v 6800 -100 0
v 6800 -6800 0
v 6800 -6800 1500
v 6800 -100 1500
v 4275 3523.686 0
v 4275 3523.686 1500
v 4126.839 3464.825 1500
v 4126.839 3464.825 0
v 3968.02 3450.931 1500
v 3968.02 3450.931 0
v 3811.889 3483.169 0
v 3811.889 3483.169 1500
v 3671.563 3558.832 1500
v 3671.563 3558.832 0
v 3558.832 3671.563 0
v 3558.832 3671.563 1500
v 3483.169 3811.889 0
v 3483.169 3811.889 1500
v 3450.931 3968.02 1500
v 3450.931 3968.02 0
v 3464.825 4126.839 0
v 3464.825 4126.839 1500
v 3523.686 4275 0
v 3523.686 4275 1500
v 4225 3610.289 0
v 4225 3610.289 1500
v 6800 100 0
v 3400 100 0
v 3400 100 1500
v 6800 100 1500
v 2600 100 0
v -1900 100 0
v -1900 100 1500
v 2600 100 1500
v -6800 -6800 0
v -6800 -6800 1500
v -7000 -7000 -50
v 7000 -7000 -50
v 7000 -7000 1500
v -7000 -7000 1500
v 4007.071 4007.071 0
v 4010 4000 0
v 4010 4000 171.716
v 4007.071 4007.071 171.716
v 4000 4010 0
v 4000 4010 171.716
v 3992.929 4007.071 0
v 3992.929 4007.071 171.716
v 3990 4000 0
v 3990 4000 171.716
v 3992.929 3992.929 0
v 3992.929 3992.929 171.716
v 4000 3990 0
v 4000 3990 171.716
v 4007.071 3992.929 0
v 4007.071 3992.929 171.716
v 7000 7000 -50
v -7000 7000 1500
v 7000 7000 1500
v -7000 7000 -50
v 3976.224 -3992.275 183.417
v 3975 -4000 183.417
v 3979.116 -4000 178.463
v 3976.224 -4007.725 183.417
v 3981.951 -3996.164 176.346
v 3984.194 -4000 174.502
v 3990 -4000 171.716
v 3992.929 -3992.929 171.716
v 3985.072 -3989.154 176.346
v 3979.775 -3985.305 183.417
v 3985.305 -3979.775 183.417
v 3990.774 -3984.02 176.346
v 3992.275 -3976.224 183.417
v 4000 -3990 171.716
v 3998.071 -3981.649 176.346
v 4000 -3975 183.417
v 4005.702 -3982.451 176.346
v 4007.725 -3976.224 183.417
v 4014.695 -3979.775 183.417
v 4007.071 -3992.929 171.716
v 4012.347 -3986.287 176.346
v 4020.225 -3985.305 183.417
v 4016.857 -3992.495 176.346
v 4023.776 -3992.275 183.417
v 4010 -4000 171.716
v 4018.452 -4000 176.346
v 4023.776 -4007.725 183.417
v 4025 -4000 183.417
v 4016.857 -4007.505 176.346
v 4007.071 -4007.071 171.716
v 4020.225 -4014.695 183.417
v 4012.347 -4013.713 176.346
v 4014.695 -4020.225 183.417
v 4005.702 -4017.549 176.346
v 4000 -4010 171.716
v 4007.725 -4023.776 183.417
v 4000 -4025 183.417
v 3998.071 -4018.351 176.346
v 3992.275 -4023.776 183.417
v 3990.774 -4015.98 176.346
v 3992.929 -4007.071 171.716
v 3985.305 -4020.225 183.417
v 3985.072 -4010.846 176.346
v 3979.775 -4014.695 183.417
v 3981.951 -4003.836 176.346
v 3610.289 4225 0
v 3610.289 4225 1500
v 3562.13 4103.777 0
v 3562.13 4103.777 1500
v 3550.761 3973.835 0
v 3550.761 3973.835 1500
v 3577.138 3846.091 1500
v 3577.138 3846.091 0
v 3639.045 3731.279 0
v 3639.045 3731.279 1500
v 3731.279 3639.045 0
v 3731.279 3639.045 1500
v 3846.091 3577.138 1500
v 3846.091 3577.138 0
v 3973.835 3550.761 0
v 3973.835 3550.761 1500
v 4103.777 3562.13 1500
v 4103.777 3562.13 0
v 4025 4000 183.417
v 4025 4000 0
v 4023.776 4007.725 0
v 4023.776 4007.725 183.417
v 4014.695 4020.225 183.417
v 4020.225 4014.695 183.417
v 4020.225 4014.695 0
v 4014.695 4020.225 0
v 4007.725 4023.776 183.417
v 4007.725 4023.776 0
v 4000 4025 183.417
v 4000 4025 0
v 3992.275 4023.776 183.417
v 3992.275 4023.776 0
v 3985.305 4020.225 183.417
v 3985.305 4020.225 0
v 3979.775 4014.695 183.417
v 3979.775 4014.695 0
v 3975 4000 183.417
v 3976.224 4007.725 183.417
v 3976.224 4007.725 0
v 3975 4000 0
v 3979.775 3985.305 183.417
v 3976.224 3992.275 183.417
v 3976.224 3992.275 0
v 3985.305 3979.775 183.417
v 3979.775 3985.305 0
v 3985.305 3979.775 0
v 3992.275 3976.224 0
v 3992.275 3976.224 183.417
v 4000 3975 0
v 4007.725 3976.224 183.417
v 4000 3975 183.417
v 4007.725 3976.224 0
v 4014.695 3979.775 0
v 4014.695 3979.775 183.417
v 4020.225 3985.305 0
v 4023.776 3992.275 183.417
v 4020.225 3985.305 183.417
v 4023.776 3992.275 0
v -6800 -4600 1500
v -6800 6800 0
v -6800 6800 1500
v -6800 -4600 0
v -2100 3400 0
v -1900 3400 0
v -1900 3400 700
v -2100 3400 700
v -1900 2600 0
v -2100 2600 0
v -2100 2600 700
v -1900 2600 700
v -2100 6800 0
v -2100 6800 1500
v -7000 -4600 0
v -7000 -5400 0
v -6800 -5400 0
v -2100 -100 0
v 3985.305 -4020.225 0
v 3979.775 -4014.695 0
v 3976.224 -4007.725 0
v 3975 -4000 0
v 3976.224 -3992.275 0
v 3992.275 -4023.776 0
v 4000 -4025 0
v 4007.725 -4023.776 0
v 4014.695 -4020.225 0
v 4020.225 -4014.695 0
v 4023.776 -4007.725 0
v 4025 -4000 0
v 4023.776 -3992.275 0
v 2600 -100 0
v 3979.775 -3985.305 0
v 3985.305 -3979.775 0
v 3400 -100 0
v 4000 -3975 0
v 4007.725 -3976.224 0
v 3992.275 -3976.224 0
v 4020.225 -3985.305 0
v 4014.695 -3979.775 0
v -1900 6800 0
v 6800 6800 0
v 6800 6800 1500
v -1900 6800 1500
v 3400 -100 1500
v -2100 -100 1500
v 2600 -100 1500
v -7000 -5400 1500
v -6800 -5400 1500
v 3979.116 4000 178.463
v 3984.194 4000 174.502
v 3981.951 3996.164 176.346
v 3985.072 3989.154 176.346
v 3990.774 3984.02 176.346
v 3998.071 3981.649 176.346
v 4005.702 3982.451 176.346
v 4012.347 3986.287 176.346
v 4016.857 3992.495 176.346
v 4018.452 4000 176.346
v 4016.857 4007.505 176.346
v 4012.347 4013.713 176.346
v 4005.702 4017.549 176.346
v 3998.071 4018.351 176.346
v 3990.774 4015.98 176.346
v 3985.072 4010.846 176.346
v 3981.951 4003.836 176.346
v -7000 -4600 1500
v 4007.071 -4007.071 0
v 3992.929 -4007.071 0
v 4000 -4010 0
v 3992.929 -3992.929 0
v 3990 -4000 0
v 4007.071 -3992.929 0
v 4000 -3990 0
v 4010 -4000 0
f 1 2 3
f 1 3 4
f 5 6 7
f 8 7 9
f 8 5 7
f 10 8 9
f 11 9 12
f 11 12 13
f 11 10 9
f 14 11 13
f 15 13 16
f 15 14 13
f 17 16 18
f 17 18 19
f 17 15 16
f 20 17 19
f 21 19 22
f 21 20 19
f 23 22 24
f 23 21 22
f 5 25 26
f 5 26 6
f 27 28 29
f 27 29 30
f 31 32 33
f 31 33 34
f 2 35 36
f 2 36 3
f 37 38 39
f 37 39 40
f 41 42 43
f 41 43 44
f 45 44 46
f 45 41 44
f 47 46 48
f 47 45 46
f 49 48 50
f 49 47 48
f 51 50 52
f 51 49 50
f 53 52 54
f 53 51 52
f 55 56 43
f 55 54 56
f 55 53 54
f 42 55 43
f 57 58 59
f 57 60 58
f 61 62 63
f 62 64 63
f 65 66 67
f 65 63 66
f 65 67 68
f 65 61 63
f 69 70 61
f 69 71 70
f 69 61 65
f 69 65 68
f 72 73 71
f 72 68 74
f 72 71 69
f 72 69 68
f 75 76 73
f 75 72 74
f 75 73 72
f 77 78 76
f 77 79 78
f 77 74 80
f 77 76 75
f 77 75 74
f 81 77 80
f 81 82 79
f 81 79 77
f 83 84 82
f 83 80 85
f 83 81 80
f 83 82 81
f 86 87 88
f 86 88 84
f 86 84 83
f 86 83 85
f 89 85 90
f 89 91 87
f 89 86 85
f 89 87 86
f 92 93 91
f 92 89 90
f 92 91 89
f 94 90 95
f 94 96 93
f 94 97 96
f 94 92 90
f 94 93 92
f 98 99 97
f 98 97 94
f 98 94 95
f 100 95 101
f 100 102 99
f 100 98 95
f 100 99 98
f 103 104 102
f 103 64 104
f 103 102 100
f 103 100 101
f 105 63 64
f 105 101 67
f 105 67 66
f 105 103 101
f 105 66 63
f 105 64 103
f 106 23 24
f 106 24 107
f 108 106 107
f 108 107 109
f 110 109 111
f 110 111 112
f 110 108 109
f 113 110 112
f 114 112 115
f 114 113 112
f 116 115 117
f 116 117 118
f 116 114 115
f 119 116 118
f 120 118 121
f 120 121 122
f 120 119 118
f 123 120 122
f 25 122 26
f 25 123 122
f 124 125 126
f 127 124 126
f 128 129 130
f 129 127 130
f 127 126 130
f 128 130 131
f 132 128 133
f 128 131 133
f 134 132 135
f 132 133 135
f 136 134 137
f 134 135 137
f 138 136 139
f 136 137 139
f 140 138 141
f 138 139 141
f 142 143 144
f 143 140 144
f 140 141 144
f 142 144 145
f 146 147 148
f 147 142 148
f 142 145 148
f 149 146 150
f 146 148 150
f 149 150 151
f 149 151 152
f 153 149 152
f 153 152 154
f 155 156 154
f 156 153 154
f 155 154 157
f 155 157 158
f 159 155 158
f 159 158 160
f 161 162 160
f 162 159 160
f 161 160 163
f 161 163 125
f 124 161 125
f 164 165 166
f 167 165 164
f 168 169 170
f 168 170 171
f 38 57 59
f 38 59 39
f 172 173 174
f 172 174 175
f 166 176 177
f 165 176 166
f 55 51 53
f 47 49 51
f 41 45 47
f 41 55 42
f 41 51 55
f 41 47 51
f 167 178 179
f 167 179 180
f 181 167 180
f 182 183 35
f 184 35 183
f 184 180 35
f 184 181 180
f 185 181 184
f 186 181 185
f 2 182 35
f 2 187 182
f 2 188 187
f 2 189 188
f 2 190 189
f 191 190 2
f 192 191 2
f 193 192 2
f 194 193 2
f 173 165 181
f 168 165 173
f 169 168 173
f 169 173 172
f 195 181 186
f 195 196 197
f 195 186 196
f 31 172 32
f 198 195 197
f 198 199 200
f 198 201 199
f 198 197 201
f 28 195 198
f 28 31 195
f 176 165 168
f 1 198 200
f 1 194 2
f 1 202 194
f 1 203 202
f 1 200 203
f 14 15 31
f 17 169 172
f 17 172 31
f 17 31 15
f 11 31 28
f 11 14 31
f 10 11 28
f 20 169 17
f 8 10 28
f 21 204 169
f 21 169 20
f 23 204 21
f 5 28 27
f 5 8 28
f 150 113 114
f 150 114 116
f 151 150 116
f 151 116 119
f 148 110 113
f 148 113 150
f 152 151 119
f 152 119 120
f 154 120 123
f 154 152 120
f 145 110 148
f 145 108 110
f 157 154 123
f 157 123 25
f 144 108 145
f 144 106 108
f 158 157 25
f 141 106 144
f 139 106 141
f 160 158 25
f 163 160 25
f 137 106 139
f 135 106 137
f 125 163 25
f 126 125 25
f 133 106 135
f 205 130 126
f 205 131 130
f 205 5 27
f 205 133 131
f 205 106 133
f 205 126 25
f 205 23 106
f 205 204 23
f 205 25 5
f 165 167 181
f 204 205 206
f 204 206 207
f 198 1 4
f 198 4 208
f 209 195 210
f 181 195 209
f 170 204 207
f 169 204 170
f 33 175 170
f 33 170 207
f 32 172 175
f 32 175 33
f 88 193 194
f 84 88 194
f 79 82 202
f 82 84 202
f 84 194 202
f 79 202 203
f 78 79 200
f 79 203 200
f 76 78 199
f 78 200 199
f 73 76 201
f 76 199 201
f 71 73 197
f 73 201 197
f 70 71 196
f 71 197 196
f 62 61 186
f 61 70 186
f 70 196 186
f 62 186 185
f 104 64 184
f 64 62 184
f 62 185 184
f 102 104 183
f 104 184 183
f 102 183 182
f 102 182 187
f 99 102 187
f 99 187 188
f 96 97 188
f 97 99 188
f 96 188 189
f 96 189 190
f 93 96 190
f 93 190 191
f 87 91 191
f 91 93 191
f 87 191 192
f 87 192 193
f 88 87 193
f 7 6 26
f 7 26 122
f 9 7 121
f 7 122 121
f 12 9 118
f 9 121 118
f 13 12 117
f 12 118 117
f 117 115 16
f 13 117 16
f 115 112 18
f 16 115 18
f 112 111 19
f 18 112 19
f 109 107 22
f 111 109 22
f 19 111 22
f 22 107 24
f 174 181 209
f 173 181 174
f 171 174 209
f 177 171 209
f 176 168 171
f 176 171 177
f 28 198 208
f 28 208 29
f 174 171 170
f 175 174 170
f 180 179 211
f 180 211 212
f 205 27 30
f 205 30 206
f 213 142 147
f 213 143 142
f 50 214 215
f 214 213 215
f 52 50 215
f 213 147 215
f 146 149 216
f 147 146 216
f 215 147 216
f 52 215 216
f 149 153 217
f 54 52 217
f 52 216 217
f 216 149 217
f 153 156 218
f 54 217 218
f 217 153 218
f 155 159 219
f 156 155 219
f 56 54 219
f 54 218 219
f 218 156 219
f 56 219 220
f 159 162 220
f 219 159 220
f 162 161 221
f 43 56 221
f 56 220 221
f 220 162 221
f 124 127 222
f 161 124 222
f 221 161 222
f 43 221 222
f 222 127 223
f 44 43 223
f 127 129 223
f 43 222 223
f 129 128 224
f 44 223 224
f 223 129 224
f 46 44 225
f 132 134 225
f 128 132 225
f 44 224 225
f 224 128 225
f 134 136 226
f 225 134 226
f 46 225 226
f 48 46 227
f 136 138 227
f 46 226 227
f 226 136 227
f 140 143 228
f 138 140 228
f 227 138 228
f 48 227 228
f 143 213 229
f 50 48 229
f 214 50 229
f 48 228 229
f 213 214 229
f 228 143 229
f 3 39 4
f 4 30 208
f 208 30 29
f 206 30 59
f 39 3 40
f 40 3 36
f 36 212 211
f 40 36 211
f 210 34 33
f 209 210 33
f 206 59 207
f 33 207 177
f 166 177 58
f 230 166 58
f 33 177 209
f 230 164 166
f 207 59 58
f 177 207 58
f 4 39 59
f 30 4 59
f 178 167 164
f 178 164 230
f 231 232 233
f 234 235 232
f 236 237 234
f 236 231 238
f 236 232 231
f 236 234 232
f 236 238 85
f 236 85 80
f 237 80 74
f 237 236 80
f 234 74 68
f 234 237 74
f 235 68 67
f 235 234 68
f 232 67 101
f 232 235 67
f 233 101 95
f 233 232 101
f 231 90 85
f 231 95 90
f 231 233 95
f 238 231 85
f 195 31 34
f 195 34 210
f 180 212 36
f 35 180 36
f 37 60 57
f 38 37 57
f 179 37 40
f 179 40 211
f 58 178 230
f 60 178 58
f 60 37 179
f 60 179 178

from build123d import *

# Parameters (mm, degrees)
SKETCH_1_W          = 14000
SKETCH_1_H          = 14000
EXTRUDE_1_DEPTH     = 50
SKETCH_2_R          = 25
SKETCH_2_R_2        = 10
EXTRUDE_2_DEPTH     = 1500
SKETCH_3_R          = 25
CUT_EXTRUDE_1_DEPTH = 1300
SKETCH_6_W          = 200
SKETCH_6_H          = 1519.653769674
EXTRUDE_3_DEPTH     = 800


with BuildPart() as part:
    # 草图1 → 凸台-拉伸1 (new body)
    with BuildSketch(Plane.XY):
        Rectangle(SKETCH_1_W, SKETCH_1_H)
    extrude(amount=-EXTRUDE_1_DEPTH)

    # 草图2 → 凸台-拉伸2 (add)
    with BuildSketch(Plane.XY):
        with Locations((4000, -4000)):
            Circle(SKETCH_2_R)
        with Locations((4000, -4000)):
            Circle(SKETCH_2_R_2, mode=Mode.SUBTRACT)
        with Locations((4000, 4000)):
            Circle(SKETCH_2_R)
        with Locations((4000, 4000)):
            Circle(SKETCH_2_R_2, mode=Mode.SUBTRACT)
        Polygon((-7000, 7000), (7000, 7000), (7000, -7000), (-7000, -7000), (-7000, -5400), (-6800, -5400), (-6800, -6800), (6800, -6800), (6800, -100), (3400, -100), (3400, 100), (6800, 100), (6800, 6800), (-1900, 6800), (-1900, 3400), (-2100, 3400), (-2100, 6800), (-6800, 6800), (-6800, -4600), (-7000, -4600), align=None)
        Polygon((2600, 100), (2600, -100), (-2100, -100), (-2100, 2600), (-1900, 2600), (-1900, 100), align=None)
        with BuildLine():
            Line((3523.686027919, 4275), (3610.288568297, 4225))
            ThreePointArc((3610.288568297, 4225), (3681.801948466, 3681.801948466), (4225, 3610.288568297))
            Line((4225, 3610.288568297), (4275, 3523.686027919))
            ThreePointArc((4275, 3523.686027919), (3611.091270347, 3611.091270347), (3523.686027919, 4275))
        make_face()
    extrude(amount=EXTRUDE_2_DEPTH)

    # 草图3 → 切除-拉伸1 (cut)
    with BuildSketch(Plane.XY.offset(1500)):
        with Locations((4000, 4000)):
            Circle(SKETCH_3_R)
        with Locations((4000, -4000)):
            Circle(SKETCH_3_R)
    extrude(amount=-CUT_EXTRUDE_1_DEPTH, mode=Mode.SUBTRACT)

    # 草图5 → 切除-旋转2 (revolve, cut)
    with BuildSketch(Plane(origin=(0, -4000, 0), x_dir=(1, 0, 0), z_dir=(0, 1, 0))):
        with BuildLine():
            Line((4000, -230), (4000, -170))
            ThreePointArc((4000, -170), (3970, -200), (4000, -230))
        make_face()
    cut_revolve_2 = revolve(axis=Axis((4000, -4000, 800), (0, 0, -1)), mode=Mode.SUBTRACT)

    # 镜向1: 切除-旋转2 across plane
    add(cut_revolve_2.mirror(Plane.ZX), mode=Mode.SUBTRACT)

    # 草图6 → 凸台-拉伸3 (add)
    with BuildSketch(Plane.XY.offset(1500)):
        with Locations((-2000, 2912.116810871)):
            Rectangle(SKETCH_6_W, SKETCH_6_H)
    extrude(amount=-EXTRUDE_3_DEPTH)


solid = part.part
